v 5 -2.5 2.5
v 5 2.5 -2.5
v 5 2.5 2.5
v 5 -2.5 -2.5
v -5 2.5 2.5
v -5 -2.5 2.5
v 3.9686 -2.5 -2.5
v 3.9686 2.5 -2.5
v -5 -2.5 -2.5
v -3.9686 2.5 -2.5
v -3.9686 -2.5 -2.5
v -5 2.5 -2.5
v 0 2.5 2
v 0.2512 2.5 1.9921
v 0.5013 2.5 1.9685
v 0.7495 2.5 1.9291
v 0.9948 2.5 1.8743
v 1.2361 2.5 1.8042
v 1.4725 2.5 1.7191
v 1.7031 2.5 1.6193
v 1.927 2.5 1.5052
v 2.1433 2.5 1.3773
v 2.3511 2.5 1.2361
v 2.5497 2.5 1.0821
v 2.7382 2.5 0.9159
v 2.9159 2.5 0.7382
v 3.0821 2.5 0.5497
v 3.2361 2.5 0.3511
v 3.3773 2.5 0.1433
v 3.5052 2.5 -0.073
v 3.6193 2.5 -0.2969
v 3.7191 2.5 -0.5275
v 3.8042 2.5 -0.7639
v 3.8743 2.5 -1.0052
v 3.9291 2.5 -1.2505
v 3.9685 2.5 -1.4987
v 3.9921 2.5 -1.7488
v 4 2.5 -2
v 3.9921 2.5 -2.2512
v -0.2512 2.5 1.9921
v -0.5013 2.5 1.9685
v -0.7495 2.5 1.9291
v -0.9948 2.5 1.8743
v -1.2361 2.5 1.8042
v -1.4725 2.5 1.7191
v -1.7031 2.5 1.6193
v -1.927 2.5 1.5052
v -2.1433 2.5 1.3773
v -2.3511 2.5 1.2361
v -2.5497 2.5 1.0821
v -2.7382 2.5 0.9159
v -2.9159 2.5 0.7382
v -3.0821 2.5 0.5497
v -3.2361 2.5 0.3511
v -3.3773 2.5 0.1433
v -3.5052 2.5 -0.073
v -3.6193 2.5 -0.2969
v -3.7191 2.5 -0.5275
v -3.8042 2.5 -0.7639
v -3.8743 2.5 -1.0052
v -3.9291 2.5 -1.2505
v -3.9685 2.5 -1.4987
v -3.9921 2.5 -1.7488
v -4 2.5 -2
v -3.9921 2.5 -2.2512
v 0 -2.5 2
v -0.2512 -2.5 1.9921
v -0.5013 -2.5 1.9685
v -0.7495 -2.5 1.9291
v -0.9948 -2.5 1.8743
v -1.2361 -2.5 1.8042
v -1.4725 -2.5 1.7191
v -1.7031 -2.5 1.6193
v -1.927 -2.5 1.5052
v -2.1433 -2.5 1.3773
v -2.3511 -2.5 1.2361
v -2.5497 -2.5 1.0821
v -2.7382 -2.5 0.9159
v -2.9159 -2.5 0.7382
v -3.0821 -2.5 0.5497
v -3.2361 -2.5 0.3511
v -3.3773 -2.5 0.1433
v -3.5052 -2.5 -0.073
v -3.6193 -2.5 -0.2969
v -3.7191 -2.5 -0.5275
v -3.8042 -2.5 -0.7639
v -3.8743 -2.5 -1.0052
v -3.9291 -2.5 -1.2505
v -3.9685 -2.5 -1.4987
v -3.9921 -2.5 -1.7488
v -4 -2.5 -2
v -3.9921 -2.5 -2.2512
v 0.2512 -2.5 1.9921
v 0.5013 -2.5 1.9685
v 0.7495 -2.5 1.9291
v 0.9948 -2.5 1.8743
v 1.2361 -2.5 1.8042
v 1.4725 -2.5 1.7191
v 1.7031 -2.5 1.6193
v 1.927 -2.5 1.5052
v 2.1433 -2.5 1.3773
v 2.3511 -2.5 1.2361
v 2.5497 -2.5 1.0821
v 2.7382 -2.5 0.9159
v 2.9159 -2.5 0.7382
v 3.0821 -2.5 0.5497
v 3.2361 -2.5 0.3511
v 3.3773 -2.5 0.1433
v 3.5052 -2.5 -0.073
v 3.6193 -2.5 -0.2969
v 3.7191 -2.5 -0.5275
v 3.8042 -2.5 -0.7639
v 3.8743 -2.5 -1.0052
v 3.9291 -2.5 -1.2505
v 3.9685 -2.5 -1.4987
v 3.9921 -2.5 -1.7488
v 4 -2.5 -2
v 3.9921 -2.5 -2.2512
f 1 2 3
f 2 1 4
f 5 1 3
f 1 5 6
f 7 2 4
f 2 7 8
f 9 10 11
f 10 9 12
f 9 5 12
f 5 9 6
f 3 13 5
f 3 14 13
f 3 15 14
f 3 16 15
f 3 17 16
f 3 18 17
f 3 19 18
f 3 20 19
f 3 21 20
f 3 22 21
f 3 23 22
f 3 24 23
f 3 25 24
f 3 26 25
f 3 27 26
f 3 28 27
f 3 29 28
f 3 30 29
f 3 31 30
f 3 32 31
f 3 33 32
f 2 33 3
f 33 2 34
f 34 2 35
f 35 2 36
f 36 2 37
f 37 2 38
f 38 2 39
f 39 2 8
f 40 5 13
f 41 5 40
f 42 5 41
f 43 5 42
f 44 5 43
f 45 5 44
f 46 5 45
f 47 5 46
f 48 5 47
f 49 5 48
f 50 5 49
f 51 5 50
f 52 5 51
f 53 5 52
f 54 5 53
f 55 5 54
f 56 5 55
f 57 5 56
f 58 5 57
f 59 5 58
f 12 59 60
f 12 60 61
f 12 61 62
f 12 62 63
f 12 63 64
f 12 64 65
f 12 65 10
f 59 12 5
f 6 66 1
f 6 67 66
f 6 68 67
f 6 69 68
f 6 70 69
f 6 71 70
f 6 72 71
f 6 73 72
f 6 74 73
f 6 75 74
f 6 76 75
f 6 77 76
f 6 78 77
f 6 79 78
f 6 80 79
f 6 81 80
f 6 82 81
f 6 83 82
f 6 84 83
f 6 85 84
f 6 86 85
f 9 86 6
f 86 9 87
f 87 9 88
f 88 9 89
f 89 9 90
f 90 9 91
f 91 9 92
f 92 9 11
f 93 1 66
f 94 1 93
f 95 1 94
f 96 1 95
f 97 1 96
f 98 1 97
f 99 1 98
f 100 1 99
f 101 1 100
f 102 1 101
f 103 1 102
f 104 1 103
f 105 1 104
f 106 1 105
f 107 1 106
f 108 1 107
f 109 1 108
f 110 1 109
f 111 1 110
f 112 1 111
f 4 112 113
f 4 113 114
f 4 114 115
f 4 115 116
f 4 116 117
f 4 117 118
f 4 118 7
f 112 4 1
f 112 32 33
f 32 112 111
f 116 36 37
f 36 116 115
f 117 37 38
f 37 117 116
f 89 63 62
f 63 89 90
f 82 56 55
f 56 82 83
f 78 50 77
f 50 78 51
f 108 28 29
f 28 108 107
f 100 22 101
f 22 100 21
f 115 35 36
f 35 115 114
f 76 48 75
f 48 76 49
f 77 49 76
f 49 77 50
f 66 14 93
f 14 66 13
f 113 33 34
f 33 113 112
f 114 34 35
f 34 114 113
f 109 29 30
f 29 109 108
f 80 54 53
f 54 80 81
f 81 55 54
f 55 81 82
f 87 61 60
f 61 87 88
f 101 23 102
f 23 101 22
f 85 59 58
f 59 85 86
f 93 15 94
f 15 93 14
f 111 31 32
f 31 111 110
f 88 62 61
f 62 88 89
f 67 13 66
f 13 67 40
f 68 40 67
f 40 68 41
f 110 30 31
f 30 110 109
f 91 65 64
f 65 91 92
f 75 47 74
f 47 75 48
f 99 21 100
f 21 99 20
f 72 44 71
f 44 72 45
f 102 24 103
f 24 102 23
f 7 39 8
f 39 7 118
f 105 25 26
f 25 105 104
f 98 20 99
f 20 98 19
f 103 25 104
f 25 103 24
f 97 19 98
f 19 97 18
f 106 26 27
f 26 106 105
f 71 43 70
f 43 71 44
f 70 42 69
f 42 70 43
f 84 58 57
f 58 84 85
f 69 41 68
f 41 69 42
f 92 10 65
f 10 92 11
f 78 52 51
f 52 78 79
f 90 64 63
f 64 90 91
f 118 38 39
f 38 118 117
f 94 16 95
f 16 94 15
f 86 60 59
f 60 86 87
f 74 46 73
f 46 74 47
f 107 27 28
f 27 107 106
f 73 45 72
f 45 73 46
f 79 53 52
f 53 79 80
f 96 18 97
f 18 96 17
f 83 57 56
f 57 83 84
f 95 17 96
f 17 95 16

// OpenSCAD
$fn = 100;
difference() {
cube([10,5,5], center=true);
rotate([90,0,0]) translate([0,-2.00,0]) cylinder(10,4.00,4.00, center=true);
}
